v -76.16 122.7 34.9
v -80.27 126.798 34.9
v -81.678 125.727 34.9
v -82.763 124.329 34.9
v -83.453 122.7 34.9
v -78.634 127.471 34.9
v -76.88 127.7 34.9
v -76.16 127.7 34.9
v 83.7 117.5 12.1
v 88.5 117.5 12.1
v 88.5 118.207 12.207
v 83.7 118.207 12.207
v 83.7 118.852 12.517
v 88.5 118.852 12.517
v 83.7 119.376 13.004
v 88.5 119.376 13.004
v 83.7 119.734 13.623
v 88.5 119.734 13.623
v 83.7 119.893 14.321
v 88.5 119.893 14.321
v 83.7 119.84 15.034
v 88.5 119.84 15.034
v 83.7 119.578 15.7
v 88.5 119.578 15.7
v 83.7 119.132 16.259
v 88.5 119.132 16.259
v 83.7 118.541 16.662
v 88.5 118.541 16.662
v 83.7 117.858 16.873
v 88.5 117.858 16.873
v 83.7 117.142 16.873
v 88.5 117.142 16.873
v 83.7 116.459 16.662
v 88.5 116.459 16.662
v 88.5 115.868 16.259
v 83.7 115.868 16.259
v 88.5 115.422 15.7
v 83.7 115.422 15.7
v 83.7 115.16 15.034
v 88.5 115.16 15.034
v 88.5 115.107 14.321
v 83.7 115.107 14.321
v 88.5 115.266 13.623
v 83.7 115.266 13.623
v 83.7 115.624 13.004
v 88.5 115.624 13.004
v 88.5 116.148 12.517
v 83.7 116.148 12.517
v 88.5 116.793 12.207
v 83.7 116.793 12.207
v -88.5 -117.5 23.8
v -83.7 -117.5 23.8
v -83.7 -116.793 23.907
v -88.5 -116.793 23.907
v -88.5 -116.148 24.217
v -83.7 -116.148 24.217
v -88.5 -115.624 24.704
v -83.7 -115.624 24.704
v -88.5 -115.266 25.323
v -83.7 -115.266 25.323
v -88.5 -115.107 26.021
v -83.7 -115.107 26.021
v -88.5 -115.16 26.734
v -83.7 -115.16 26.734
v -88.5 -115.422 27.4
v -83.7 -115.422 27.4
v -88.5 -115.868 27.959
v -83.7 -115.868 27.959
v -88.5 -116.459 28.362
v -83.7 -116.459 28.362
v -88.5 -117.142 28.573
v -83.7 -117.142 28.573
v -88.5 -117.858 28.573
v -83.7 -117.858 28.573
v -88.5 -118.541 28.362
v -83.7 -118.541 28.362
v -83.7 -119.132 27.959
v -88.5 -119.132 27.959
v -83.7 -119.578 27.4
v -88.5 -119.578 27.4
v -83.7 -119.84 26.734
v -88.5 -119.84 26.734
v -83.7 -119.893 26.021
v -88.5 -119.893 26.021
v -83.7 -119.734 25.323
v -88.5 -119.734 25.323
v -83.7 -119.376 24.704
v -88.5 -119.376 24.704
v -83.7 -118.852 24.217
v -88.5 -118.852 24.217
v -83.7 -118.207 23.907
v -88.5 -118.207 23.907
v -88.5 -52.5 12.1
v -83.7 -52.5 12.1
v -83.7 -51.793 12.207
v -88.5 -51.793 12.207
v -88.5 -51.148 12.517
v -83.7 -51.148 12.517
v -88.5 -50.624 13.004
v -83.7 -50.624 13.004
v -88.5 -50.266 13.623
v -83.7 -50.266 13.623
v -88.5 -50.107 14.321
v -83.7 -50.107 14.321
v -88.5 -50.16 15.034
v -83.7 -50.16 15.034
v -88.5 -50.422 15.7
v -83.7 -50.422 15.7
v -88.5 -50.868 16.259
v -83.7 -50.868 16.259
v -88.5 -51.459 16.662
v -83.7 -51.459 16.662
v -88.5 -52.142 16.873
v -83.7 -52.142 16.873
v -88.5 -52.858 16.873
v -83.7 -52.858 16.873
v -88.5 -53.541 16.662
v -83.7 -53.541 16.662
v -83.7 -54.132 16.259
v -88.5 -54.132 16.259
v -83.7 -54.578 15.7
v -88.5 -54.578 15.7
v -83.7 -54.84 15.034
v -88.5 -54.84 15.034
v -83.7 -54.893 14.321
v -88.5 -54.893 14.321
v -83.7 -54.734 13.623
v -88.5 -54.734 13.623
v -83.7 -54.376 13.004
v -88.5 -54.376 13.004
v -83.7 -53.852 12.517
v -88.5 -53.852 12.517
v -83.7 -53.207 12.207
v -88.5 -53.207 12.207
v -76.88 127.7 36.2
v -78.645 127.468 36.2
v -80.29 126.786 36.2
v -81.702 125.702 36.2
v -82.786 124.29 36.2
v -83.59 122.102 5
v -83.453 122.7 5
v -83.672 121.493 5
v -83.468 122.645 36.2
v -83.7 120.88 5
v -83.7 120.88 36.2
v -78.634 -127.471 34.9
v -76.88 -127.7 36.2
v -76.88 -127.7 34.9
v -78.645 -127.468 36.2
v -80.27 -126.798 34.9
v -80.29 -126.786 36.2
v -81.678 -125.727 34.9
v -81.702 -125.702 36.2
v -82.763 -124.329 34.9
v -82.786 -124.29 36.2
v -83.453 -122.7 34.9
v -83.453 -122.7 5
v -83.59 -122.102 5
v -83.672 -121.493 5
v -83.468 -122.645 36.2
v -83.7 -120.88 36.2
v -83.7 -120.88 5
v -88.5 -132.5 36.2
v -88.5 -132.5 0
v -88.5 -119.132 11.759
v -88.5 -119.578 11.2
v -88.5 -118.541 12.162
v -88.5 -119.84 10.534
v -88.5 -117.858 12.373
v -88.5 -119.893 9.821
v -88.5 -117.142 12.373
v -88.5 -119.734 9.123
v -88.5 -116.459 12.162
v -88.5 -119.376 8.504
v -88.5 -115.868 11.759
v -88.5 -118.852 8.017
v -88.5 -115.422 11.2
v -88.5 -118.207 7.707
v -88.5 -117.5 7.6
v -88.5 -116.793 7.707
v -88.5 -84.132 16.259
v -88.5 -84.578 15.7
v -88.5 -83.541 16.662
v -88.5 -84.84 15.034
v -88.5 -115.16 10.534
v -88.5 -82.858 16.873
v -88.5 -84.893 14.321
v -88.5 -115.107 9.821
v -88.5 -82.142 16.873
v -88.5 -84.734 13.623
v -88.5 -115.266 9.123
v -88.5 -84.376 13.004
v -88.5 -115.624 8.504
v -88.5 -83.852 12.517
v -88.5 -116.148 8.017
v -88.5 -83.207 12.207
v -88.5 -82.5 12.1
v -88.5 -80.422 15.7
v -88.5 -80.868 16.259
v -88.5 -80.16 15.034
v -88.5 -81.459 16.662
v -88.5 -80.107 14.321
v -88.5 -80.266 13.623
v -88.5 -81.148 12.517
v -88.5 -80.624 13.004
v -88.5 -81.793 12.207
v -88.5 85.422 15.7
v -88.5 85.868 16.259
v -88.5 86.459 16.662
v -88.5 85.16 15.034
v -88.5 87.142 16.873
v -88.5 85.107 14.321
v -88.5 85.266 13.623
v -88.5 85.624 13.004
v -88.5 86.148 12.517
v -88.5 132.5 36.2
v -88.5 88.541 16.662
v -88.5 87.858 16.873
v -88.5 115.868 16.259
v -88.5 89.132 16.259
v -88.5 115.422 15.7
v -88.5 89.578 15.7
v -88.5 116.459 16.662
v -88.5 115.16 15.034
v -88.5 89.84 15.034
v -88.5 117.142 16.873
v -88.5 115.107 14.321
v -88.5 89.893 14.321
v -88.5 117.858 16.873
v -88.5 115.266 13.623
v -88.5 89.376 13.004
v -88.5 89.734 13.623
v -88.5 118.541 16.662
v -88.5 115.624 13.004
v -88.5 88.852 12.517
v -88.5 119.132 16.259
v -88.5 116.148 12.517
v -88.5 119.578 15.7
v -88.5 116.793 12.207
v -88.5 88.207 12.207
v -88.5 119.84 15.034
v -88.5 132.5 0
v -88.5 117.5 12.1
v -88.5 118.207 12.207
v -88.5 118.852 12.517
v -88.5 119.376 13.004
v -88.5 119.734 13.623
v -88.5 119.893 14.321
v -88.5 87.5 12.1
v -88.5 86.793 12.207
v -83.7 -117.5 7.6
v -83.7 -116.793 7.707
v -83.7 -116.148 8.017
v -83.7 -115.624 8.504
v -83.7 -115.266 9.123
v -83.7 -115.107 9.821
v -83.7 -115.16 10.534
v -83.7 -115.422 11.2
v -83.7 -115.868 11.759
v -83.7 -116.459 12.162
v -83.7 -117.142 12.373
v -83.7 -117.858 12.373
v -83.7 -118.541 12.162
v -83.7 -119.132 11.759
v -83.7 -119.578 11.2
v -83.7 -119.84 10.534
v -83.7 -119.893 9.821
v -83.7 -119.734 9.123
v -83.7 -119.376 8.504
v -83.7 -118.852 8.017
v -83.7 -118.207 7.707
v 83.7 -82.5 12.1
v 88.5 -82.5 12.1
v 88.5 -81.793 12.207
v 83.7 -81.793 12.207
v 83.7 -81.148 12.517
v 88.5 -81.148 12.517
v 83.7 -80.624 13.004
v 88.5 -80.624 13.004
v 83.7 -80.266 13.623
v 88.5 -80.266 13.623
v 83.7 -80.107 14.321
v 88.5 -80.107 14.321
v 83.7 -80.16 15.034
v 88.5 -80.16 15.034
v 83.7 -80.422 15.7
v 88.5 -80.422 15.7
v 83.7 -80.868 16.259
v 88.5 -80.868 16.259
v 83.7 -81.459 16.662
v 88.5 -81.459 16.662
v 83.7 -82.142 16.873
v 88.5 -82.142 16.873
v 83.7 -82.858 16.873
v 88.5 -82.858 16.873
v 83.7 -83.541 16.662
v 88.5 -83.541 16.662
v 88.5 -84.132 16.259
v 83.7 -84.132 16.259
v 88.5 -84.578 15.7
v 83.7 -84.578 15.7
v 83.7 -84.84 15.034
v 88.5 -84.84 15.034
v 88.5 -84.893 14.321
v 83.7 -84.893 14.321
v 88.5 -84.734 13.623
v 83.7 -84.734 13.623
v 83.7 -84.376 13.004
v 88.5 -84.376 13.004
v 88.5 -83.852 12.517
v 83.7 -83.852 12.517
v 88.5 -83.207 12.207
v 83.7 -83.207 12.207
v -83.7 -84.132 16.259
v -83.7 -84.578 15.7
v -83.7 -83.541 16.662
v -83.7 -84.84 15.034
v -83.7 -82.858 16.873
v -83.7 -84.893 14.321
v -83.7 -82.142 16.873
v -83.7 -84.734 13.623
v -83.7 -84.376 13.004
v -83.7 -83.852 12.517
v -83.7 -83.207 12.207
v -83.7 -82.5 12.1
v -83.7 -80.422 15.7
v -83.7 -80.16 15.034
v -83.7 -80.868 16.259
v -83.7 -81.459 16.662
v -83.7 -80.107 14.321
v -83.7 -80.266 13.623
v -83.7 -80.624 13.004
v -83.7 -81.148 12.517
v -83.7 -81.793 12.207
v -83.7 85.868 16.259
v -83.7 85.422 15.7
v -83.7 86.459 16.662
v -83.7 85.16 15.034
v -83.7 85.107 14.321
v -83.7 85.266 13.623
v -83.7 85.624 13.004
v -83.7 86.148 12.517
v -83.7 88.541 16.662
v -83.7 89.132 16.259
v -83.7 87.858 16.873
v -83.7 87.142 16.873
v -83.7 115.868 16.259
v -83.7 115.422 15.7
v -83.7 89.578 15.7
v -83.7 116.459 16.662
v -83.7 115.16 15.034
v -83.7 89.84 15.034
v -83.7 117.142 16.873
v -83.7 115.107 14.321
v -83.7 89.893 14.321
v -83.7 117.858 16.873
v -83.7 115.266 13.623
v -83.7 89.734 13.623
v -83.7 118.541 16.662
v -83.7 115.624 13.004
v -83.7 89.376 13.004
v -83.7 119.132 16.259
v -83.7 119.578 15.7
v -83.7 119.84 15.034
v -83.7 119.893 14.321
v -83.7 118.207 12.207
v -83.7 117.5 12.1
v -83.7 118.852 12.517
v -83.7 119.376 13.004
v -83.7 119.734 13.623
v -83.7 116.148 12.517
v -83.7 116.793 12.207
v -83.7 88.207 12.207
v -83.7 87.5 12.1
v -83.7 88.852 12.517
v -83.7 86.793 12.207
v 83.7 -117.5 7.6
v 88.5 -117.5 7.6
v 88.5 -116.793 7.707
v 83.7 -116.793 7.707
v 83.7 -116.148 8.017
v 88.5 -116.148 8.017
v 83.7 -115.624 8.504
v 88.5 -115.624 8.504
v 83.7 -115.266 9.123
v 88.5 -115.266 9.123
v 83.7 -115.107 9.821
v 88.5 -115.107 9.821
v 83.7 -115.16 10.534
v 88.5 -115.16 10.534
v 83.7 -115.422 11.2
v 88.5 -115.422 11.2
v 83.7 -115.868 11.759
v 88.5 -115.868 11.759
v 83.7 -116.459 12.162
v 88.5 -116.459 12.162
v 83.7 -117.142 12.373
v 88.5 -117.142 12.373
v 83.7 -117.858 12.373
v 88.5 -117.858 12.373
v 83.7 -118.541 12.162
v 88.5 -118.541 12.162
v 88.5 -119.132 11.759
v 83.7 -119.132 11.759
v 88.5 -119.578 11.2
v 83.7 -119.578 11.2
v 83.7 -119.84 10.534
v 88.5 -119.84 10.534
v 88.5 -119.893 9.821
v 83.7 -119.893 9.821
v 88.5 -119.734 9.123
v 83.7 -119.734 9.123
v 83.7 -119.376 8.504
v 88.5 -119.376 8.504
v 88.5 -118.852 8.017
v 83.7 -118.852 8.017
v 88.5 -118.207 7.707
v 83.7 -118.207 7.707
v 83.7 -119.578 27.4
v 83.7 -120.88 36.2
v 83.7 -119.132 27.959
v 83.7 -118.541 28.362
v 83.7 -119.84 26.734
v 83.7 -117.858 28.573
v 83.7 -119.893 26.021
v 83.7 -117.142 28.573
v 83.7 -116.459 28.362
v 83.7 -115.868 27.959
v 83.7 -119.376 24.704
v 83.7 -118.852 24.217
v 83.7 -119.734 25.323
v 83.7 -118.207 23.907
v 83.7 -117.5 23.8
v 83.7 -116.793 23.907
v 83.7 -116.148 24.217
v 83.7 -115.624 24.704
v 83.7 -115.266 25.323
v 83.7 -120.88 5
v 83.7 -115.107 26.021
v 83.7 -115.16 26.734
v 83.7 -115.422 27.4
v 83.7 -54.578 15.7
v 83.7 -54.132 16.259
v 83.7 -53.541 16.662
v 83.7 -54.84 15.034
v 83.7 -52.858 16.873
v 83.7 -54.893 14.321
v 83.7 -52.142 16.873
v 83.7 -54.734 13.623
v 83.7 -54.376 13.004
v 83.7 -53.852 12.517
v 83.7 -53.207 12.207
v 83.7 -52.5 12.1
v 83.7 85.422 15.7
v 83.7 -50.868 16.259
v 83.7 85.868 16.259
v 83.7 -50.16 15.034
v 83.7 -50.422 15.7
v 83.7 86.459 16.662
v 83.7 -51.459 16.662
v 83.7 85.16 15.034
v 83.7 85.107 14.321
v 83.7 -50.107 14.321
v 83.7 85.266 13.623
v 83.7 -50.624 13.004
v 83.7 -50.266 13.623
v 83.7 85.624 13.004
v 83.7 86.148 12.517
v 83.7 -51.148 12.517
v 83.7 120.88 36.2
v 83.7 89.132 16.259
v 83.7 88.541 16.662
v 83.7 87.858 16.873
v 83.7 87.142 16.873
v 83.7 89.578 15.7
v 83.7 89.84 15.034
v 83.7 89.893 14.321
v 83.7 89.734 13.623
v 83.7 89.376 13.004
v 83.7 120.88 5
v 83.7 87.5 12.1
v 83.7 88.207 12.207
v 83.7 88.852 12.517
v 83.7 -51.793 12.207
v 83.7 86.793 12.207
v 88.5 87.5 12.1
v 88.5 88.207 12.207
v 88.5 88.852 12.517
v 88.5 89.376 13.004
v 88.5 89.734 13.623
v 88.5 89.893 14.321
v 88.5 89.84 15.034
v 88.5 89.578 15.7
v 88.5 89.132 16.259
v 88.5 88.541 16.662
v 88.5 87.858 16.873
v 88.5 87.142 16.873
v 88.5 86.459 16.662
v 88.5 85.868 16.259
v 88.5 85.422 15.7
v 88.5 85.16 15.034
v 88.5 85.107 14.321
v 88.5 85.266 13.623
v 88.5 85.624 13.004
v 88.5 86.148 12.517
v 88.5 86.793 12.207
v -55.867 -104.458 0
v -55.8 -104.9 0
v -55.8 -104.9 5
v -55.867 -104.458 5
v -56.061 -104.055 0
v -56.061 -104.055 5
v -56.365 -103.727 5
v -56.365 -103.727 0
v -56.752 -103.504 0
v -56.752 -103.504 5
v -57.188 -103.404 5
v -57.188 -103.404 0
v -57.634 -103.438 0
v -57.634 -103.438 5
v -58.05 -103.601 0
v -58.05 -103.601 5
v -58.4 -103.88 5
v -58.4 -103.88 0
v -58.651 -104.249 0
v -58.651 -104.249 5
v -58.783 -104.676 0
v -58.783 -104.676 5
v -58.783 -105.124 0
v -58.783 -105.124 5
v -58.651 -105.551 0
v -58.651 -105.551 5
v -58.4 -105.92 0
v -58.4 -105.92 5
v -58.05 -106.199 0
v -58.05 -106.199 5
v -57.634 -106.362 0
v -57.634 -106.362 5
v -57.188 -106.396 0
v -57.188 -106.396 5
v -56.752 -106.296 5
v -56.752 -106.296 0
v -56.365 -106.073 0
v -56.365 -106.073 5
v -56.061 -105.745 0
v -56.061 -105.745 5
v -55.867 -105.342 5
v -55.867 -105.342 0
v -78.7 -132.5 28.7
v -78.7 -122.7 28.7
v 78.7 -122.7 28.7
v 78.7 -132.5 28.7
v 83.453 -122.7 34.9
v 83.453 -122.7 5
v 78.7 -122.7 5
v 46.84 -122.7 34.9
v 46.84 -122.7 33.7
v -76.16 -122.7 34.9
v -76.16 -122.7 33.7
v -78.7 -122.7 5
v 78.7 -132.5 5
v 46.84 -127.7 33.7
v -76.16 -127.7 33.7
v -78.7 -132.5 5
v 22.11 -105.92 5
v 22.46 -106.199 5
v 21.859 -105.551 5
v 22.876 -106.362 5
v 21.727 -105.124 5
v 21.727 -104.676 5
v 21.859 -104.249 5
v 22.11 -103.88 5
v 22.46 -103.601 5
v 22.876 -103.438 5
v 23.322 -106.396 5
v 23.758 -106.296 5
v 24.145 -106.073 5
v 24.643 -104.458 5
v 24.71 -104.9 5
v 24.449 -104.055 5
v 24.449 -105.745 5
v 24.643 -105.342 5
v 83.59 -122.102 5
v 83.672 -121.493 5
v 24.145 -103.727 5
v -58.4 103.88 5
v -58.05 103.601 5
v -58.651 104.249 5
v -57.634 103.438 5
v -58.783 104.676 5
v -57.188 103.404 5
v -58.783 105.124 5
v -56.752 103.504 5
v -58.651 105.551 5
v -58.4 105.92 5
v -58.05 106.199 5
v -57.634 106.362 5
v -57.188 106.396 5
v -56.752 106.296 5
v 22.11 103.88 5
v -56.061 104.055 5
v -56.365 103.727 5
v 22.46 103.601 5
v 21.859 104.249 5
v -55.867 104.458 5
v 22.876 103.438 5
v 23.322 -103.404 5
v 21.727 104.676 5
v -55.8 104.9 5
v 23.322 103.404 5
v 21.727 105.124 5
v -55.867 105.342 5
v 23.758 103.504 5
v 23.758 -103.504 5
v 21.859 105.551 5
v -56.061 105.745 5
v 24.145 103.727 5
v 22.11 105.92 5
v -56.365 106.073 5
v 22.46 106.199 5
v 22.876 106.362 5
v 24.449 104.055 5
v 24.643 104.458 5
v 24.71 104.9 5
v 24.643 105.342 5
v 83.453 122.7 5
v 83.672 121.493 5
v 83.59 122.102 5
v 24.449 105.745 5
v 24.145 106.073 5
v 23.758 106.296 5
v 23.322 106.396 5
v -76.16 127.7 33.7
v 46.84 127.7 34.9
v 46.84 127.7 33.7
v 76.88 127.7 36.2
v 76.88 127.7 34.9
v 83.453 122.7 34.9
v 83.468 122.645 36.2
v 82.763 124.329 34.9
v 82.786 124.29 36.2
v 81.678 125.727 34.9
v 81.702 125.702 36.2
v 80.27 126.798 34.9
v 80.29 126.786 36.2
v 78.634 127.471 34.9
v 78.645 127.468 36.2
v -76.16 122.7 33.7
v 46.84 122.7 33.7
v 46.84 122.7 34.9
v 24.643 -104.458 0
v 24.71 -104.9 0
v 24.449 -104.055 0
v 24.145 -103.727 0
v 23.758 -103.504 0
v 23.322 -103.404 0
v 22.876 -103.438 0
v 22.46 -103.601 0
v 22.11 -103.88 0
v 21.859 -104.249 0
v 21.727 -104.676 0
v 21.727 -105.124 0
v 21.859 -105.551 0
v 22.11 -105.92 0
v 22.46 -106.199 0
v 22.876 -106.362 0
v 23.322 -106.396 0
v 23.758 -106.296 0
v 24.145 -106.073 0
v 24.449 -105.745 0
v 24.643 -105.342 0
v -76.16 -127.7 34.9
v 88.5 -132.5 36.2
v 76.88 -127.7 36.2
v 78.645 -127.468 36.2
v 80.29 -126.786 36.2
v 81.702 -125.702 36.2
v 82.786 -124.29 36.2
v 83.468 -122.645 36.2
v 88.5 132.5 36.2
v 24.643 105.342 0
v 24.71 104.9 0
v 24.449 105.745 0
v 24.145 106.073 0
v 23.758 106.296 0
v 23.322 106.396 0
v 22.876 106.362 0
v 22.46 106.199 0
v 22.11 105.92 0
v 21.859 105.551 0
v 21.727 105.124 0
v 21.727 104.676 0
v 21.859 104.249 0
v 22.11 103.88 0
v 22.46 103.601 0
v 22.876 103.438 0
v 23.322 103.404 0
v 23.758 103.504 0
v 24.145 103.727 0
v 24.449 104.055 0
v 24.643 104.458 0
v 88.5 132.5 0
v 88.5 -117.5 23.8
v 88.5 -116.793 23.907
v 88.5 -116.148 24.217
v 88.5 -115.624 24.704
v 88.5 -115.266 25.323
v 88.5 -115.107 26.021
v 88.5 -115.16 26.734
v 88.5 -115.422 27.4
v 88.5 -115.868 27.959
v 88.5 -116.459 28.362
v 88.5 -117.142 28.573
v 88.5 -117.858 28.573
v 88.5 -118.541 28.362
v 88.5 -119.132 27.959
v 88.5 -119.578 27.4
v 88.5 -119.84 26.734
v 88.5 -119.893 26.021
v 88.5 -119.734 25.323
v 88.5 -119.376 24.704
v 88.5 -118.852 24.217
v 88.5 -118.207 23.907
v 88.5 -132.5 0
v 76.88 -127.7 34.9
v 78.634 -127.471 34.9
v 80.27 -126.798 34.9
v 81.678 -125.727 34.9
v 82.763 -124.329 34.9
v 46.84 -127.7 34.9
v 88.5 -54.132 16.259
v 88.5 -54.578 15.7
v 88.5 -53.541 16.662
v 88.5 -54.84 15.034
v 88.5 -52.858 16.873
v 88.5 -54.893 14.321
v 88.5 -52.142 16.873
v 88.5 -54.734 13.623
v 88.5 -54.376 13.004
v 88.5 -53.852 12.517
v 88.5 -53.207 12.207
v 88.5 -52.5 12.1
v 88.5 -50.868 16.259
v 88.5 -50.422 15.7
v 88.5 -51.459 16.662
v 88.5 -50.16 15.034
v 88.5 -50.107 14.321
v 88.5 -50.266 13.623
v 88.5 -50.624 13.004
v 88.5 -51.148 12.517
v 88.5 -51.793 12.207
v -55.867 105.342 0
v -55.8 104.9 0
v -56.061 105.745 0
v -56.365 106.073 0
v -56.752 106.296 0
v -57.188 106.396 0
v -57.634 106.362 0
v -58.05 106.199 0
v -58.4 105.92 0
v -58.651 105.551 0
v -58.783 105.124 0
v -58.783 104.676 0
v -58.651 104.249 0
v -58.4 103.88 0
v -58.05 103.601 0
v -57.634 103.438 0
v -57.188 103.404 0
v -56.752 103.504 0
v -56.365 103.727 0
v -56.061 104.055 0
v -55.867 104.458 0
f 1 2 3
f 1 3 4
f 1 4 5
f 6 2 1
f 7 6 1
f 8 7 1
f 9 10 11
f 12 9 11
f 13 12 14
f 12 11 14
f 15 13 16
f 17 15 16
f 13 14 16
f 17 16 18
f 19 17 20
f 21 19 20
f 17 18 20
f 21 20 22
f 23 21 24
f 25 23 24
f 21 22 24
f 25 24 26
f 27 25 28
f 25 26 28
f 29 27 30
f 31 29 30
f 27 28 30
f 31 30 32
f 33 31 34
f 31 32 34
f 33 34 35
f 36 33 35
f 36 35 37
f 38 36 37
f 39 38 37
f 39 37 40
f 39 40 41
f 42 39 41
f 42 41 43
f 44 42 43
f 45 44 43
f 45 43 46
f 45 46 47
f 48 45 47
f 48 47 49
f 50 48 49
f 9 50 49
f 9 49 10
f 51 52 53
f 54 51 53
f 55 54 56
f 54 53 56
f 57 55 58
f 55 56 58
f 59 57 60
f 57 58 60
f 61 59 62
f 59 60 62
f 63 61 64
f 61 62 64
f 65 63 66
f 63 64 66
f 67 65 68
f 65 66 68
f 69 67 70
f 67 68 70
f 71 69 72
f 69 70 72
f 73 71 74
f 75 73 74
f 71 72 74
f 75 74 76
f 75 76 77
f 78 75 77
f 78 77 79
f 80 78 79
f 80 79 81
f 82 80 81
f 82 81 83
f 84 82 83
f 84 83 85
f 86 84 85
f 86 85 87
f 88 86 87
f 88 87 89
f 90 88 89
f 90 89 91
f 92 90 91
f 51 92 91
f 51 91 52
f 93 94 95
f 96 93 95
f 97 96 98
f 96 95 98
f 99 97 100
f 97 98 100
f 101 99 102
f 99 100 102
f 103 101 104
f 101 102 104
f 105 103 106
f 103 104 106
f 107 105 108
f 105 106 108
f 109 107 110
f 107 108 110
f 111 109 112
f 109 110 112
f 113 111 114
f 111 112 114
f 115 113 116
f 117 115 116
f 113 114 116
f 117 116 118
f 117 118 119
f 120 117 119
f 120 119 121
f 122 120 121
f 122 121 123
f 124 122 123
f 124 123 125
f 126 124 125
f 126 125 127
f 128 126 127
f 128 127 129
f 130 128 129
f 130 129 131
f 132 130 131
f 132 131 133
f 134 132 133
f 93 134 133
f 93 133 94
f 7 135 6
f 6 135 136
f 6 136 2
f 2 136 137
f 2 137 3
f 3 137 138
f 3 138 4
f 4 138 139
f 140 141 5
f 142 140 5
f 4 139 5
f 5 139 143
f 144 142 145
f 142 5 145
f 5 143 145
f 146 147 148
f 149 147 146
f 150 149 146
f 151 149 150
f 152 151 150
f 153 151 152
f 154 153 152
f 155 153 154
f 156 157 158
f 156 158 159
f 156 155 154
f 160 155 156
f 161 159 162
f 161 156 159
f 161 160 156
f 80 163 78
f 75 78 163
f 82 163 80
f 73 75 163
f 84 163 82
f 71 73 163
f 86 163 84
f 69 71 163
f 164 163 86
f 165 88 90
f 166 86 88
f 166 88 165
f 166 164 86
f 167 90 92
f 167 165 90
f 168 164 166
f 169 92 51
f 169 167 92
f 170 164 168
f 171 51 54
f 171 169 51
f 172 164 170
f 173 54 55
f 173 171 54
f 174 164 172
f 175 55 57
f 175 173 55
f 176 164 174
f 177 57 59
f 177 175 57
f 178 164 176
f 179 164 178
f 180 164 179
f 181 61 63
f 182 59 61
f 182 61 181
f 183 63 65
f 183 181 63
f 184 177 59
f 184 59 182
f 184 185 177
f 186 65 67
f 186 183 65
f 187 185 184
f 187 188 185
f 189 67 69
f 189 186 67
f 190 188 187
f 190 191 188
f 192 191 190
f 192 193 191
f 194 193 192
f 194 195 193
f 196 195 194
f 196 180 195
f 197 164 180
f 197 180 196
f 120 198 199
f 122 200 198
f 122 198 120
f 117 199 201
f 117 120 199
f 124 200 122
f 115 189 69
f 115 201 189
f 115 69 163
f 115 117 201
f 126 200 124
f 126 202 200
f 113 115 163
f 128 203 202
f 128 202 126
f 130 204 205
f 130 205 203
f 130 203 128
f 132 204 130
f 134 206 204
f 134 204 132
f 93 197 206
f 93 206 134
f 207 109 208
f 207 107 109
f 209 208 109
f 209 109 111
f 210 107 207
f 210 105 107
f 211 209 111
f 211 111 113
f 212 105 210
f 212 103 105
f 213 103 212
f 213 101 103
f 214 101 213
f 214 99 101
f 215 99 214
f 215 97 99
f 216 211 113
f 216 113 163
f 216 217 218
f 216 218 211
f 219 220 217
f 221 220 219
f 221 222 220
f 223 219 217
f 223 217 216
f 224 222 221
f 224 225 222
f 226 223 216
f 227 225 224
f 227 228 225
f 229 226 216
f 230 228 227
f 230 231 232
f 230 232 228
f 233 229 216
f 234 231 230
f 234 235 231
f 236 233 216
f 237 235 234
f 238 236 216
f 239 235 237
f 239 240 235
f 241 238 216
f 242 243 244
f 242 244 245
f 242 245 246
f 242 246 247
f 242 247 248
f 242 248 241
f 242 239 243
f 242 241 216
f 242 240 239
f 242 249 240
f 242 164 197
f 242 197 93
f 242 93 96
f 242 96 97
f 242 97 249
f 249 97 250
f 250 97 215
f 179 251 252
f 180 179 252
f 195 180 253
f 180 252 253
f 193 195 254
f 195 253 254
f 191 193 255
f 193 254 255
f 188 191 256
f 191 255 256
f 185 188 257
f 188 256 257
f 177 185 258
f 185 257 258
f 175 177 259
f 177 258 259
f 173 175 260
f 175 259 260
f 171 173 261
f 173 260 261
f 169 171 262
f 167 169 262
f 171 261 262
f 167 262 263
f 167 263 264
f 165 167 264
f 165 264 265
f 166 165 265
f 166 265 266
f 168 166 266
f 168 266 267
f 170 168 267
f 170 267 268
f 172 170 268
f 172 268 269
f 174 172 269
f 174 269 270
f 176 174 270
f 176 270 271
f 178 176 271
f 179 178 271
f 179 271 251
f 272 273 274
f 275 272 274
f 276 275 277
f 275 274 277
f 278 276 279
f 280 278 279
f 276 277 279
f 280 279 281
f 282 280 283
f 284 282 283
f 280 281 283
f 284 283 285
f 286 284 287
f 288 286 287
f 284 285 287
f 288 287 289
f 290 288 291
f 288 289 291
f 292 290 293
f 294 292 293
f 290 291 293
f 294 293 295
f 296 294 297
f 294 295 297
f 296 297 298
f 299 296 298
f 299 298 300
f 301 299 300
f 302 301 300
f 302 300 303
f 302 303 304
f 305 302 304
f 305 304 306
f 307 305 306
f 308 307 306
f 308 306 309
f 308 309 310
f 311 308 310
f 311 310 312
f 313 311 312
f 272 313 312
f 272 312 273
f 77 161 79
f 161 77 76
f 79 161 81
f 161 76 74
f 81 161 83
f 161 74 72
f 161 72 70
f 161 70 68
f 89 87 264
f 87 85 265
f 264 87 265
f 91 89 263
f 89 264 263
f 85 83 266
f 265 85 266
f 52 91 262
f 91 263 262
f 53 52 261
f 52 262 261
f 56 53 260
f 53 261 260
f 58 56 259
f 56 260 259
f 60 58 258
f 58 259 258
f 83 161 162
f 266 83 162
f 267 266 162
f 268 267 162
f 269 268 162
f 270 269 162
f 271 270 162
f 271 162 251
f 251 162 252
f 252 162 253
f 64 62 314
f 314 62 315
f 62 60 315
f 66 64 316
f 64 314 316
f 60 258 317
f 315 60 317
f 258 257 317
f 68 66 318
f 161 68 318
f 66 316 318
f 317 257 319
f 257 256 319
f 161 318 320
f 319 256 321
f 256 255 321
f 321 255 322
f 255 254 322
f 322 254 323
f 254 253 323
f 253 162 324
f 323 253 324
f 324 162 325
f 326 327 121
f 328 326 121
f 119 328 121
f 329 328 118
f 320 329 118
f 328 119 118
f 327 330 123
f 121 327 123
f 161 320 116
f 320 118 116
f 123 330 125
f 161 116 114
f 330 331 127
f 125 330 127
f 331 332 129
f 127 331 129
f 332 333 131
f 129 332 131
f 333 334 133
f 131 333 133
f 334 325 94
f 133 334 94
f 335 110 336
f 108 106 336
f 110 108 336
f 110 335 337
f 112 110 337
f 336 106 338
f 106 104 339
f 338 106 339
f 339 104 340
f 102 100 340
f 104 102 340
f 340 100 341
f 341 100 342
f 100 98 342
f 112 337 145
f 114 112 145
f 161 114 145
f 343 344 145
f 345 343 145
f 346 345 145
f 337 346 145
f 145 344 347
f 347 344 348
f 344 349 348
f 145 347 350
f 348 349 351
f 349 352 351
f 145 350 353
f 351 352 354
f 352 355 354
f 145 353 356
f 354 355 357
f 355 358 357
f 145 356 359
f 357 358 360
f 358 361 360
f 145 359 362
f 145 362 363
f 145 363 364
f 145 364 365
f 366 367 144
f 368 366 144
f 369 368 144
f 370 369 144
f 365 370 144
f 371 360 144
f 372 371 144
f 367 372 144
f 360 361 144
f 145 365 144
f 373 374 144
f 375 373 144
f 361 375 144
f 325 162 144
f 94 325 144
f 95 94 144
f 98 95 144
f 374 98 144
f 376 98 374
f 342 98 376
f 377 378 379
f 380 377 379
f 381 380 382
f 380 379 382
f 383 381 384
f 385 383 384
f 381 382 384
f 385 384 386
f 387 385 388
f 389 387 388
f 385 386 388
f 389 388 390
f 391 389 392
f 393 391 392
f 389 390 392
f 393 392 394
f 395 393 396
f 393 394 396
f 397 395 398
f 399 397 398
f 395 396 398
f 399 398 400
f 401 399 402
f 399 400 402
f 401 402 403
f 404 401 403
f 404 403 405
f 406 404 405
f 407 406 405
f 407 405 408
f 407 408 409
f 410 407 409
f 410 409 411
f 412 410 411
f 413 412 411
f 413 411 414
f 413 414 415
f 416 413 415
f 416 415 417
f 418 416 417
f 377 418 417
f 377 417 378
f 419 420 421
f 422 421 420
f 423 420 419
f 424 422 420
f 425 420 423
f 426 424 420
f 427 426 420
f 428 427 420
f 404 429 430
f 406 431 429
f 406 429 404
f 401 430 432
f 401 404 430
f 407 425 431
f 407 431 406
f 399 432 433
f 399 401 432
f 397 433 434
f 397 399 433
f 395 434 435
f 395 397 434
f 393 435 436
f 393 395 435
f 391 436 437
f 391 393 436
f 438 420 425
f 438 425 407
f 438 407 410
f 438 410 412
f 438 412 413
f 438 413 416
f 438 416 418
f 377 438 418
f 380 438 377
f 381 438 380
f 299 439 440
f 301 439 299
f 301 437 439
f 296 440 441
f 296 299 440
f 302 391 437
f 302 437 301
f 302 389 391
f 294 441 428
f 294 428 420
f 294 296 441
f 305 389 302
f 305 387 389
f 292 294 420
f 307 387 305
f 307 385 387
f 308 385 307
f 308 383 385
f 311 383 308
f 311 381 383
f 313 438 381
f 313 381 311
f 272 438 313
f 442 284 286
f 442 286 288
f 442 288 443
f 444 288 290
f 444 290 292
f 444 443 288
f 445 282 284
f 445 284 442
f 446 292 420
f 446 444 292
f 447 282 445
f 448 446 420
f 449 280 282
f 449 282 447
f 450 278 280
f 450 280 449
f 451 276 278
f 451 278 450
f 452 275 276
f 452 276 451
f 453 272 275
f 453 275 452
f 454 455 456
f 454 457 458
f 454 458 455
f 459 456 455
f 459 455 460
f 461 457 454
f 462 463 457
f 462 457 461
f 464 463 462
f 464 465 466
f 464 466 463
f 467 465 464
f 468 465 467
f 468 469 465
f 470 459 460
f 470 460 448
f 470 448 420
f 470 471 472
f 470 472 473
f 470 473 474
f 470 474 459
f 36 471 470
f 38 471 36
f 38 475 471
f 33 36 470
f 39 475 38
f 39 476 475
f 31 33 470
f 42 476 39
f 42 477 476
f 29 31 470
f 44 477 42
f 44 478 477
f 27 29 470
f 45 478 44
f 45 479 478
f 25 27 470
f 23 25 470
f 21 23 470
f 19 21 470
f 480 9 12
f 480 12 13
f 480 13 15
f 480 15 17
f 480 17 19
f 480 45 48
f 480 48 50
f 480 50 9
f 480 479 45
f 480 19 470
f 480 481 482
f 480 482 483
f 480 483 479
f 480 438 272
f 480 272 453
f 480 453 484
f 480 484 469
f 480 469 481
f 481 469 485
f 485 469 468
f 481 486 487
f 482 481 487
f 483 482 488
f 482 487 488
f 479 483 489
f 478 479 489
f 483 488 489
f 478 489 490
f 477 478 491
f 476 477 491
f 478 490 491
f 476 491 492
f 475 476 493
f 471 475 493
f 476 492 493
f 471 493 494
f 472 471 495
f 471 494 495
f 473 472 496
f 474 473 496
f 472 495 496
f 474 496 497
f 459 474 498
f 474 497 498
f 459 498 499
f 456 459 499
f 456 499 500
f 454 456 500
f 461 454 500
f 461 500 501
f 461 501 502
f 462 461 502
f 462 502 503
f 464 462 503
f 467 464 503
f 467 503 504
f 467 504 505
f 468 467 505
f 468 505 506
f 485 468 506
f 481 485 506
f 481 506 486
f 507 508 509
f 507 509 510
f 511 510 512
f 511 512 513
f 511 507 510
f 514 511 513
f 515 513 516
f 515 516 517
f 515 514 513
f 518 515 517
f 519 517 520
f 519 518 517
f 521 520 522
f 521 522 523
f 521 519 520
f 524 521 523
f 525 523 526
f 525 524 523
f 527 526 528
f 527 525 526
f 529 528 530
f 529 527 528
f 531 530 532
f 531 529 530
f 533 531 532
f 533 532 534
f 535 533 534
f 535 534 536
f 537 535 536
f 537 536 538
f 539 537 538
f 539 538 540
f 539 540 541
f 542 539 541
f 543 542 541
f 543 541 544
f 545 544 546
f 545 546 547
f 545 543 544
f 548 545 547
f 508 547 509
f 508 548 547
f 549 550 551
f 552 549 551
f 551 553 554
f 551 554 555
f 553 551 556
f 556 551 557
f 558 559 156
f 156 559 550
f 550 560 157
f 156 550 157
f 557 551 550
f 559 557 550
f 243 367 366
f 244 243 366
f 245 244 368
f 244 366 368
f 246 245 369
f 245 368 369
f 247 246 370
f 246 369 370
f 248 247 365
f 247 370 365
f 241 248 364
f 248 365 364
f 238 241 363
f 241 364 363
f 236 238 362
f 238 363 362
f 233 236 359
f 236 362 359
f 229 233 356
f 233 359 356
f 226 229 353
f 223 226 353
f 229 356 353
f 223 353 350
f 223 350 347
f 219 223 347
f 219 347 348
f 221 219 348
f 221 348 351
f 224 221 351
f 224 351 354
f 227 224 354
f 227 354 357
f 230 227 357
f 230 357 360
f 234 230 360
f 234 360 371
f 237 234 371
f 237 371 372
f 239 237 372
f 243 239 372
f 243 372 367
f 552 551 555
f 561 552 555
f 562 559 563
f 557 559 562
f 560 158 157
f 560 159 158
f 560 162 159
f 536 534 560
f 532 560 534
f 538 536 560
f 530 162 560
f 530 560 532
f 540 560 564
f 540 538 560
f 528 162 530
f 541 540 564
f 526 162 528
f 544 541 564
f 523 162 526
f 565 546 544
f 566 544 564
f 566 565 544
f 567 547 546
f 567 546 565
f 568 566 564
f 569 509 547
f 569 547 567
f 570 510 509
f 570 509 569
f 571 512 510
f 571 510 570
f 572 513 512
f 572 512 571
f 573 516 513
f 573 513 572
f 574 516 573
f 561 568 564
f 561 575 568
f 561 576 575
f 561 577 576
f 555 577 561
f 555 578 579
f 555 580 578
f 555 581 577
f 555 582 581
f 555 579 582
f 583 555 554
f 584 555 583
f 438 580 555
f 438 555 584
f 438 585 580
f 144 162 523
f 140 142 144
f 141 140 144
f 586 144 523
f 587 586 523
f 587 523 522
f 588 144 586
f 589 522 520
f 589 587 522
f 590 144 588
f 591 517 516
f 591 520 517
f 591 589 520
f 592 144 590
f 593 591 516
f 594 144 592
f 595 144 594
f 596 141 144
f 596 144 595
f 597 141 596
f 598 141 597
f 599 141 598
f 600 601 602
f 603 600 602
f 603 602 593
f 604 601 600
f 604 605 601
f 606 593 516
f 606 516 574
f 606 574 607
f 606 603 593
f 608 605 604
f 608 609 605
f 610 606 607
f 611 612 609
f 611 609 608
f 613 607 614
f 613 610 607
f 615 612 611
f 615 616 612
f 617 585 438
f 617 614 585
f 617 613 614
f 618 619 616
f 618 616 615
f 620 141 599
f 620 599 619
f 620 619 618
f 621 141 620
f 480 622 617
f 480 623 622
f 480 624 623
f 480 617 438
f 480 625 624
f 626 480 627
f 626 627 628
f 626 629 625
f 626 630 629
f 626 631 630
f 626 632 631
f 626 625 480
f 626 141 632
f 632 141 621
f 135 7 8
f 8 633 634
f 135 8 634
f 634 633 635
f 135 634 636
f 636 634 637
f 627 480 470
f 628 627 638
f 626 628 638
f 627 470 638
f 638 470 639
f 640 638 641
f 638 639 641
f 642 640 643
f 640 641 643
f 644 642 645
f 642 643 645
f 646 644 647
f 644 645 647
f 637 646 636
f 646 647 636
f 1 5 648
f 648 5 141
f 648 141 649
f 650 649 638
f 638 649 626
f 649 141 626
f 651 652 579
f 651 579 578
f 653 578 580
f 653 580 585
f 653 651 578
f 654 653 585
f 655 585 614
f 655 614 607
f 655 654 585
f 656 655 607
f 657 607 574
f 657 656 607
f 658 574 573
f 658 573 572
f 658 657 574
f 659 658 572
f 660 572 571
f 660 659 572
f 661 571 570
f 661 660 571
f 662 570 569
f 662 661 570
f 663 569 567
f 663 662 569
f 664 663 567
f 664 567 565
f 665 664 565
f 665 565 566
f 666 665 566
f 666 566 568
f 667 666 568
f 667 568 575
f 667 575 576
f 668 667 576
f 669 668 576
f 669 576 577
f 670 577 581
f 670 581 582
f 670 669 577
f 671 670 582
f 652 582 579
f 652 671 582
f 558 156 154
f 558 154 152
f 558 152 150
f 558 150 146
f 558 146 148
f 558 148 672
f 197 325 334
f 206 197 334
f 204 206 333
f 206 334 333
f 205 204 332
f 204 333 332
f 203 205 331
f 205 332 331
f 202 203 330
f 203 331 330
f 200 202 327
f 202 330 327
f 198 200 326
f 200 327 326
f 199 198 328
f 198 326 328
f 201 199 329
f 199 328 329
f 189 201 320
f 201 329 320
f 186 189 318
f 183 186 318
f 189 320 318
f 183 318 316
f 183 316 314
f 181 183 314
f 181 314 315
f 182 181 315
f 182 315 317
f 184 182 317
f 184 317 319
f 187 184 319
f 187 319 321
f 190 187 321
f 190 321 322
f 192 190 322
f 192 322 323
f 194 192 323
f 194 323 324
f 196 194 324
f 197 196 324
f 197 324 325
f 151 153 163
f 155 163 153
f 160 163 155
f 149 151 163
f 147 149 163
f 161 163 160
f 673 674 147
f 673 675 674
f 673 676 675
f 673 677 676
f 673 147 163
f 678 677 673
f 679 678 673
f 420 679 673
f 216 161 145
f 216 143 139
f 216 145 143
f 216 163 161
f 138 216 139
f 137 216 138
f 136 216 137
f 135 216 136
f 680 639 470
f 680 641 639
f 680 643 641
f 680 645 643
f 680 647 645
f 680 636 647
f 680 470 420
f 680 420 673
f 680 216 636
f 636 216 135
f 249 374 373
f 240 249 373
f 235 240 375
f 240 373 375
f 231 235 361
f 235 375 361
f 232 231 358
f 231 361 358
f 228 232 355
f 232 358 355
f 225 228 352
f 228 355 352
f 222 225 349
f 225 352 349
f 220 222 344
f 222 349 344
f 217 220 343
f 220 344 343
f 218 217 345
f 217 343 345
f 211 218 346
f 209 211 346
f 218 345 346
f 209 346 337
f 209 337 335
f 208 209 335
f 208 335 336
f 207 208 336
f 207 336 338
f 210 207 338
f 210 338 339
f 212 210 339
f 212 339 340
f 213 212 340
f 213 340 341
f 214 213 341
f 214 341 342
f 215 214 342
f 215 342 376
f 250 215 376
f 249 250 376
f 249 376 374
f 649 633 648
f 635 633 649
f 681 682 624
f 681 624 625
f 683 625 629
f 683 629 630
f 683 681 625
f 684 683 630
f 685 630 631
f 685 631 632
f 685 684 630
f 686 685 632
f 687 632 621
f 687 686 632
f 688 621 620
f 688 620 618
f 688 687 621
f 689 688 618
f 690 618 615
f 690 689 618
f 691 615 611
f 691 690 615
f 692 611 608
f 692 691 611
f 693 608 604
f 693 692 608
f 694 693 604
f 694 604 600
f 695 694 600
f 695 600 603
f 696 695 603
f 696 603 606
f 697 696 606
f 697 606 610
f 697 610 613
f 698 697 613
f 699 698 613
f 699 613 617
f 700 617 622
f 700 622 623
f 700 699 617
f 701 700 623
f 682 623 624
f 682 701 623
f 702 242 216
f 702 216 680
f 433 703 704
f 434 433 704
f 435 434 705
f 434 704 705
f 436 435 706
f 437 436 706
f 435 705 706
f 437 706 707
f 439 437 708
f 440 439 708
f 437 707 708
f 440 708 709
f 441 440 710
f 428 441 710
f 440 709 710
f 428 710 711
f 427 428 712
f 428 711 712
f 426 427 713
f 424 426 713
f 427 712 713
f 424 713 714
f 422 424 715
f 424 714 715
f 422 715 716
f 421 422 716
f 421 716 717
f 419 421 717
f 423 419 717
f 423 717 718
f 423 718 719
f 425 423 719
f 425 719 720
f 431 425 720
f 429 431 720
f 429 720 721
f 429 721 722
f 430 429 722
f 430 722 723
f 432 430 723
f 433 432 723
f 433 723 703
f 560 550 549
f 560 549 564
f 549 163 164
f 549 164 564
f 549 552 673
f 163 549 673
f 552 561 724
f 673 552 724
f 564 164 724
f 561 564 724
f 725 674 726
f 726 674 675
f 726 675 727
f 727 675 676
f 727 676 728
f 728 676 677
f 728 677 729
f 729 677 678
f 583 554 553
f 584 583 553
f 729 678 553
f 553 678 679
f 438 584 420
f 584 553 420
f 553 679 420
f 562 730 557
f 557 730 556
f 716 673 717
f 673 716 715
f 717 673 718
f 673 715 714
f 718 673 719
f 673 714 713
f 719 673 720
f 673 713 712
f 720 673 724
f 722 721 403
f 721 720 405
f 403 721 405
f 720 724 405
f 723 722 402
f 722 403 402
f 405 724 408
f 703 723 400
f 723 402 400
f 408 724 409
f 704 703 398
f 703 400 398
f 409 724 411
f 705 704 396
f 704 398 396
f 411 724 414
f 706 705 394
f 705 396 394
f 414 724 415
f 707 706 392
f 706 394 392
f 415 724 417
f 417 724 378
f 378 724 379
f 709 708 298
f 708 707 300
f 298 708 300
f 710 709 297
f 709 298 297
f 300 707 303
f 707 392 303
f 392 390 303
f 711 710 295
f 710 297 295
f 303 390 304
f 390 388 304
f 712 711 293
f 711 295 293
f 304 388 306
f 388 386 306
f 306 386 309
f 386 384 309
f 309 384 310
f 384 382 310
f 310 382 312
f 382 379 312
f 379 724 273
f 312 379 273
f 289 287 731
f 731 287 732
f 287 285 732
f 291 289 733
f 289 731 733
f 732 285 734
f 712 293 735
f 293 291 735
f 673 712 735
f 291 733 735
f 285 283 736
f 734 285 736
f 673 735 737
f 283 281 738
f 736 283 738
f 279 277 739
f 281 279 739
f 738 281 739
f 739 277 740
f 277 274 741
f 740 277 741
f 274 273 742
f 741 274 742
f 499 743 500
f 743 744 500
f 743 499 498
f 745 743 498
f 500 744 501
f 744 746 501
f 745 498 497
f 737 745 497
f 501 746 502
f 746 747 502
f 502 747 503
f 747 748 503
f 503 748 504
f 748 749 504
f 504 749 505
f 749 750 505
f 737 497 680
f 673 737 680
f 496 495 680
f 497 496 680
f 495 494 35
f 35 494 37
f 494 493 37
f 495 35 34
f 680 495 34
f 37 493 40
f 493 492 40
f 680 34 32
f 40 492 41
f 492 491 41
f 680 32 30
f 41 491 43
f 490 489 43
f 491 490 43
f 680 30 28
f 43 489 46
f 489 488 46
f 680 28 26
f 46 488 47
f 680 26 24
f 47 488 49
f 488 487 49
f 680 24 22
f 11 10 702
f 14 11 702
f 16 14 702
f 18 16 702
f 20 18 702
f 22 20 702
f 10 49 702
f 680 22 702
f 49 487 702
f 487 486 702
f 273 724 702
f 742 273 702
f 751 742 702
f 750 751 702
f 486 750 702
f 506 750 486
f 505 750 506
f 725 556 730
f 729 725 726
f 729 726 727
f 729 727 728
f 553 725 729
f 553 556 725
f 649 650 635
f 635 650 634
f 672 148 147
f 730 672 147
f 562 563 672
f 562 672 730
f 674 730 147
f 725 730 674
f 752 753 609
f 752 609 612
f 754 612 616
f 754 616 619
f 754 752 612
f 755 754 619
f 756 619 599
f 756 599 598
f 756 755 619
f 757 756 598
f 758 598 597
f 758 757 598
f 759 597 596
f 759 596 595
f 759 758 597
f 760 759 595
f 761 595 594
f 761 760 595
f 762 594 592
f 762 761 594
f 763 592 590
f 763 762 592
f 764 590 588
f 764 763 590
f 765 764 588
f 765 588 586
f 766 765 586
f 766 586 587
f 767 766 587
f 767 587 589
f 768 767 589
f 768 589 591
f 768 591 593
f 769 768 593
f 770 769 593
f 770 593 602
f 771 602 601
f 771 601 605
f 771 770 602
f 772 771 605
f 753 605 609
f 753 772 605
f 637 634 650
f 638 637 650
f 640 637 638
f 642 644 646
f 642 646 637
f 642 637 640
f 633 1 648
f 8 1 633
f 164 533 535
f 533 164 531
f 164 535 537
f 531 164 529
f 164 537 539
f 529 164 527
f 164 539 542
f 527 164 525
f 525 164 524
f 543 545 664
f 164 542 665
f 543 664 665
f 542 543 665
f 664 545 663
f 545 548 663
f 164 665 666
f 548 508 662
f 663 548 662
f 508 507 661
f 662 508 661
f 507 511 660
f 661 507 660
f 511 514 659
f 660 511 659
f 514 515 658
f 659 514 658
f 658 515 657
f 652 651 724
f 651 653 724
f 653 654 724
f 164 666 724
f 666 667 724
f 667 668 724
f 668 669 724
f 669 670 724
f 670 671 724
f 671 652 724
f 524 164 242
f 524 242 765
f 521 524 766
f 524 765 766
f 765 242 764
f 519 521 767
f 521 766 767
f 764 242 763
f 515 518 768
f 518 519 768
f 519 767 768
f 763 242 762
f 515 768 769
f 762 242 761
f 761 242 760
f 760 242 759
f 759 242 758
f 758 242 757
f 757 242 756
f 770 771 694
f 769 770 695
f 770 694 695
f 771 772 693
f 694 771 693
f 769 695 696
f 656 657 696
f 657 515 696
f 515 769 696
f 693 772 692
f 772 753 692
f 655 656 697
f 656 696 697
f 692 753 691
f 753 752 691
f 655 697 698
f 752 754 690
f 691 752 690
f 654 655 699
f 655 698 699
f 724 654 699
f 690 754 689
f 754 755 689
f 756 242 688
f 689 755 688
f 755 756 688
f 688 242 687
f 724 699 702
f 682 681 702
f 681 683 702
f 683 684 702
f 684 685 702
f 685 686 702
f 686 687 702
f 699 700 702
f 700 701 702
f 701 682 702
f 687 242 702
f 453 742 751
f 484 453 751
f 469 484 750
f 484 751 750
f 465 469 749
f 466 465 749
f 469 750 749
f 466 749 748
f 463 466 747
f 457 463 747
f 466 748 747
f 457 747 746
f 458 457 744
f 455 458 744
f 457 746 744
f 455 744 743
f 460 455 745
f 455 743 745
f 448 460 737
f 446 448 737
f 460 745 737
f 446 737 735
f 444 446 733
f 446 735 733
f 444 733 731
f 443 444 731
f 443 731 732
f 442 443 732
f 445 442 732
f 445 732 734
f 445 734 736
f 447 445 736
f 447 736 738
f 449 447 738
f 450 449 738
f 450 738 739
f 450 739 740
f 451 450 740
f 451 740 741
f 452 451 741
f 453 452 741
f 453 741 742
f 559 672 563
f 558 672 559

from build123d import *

# Parameters (mm, degrees)
SKETCH1_W           = 177
SKETCH1_H           = 265
SKETCH1_R           = 1.5
BOSS_EXTRUDE1_DEPTH = 5
SKETCH2_W           = 177
SKETCH2_H           = 265
SKETCH2_W_2         = 167.4
SKETCH2_H_2         = 255.4
BOSS_EXTRUDE2_DEPTH = 31.2
FILLET1_R           = 6.82
BOSS_EXTRUDE3_DEPTH = 29.9
SKETCH5_W           = 123
SKETCH5_H           = 5
CUT_EXTRUDE1_DEPTH  = 1.2
SKETCH9_W           = 157.4
SKETCH9_H           = 23.7
CUT_EXTRUDE3_DEPTH  = 10.8
SKETCH10_R          = 2.4
CUT_EXTRUDE4_DEPTH  = 178
SKETCH16_R          = 2.4
CUT_EXTRUDE7_DEPTH  = 177


with BuildPart() as part:
    # Sketch1 → Boss-Extrude1 (new body)
    with BuildSketch(Plane.XY):
        Rectangle(SKETCH1_W, SKETCH1_H)
        with Locations((-57.3, -104.9)):
            Circle(SKETCH1_R, mode=Mode.SUBTRACT)
        with Locations((23.21, -104.9)):
            Circle(SKETCH1_R, mode=Mode.SUBTRACT)
        with Locations((23.21, 104.9)):
            Circle(SKETCH1_R, mode=Mode.SUBTRACT)
        with Locations((-57.3, 104.9)):
            Circle(SKETCH1_R, mode=Mode.SUBTRACT)
    extrude(amount=BOSS_EXTRUDE1_DEPTH)

    # Sketch2 → Boss-Extrude2 (add)
    with BuildSketch(Plane.XY.offset(5)):
        Rectangle(SKETCH2_W, SKETCH2_H)
        Rectangle(SKETCH2_W_2, SKETCH2_H_2, mode=Mode.SUBTRACT)
    extrude(amount=BOSS_EXTRUDE2_DEPTH)

    # Fillet1
    fillet1_edges = [part.edges().sort_by_distance(p)[0] for p in [
        (83.7, -127.7, 20.6),
        (83.7, 127.7, 20.6),
        (-83.7, 127.7, 20.6),
        (-83.7, -127.7, 20.6),
    ]]
    fillet(fillet1_edges, radius=FILLET1_R)

    # Sketch4 → Boss-Extrude3 (add)
    with BuildSketch(Plane.XY.offset(5)):
        with BuildLine():
            Line((83.45267069, -122.7), (-83.45267069, -122.7))
            ThreePointArc((-83.45267069, -122.7), (-81.009164564, -126.307927781), (-76.88, -127.7))
            Line((-76.88, -127.7), (76.88, -127.7))
            ThreePointArc((76.88, -127.7), (81.009164564, -126.307927781), (83.45267069, -122.7))
        make_face()
        with BuildLine():
            ThreePointArc((-76.88, 127.7), (-81.009164564, 126.307927781), (-83.45267069, 122.7))
            Line((-83.45267069, 122.7), (83.45267069, 122.7))
            ThreePointArc((83.45267069, 122.7), (81.009164564, 126.307927781), (76.88, 127.7))
            Line((76.88, 127.7), (-76.88, 127.7))
        make_face()
    extrude(amount=BOSS_EXTRUDE3_DEPTH)

    # Sketch5 → Cut-Extrude1 (cut)
    with BuildSketch(Plane.XY.offset(34.9)):
        with Locations((-14.66, -125.2)):
            Rectangle(SKETCH5_W, SKETCH5_H)
        with Locations((-14.66, 125.2)):
            Rectangle(SKETCH5_W, SKETCH5_H)
    extrude(amount=-CUT_EXTRUDE1_DEPTH, mode=Mode.SUBTRACT)

    # Sketch9 → Cut-Extrude3 (cut, through all)
    with BuildSketch(Plane(origin=(0, -122.7, 0), x_dir=(1, 0, 0), z_dir=(0, 1, 0))):
        with Locations((0, -16.85)):
            Rectangle(SKETCH9_W, SKETCH9_H)
    extrude(amount=-CUT_EXTRUDE3_DEPTH, mode=Mode.SUBTRACT)

    # Sketch10 → Cut-Extrude4 (cut, through all)
    with BuildSketch(Plane(origin=(88.5, 0, 0), x_dir=(0, 0, -1), z_dir=(1, 0, 0))):
        with Locations((-10, -117.5)):
            Circle(SKETCH10_R)
        with Locations((-26.2, -117.5)):
            Circle(SKETCH10_R)
    extrude(amount=-CUT_EXTRUDE4_DEPTH, mode=Mode.SUBTRACT)

    # Sketch16 → Cut-Extrude7 (cut)
    with BuildSketch(Plane(origin=(88.5, 0, 0), x_dir=(0, 0, -1), z_dir=(1, 0, 0))):
        with Locations((-14.5, 117.5)):
            Circle(SKETCH16_R)
        with Locations((-14.5, 87.5)):
            Circle(SKETCH16_R)
        with Locations((-14.5, -52.5)):
            Circle(SKETCH16_R)
        with Locations((-14.5, -82.5)):
            Circle(SKETCH16_R)
    extrude(amount=-CUT_EXTRUDE7_DEPTH, mode=Mode.SUBTRACT)


solid = part.part
